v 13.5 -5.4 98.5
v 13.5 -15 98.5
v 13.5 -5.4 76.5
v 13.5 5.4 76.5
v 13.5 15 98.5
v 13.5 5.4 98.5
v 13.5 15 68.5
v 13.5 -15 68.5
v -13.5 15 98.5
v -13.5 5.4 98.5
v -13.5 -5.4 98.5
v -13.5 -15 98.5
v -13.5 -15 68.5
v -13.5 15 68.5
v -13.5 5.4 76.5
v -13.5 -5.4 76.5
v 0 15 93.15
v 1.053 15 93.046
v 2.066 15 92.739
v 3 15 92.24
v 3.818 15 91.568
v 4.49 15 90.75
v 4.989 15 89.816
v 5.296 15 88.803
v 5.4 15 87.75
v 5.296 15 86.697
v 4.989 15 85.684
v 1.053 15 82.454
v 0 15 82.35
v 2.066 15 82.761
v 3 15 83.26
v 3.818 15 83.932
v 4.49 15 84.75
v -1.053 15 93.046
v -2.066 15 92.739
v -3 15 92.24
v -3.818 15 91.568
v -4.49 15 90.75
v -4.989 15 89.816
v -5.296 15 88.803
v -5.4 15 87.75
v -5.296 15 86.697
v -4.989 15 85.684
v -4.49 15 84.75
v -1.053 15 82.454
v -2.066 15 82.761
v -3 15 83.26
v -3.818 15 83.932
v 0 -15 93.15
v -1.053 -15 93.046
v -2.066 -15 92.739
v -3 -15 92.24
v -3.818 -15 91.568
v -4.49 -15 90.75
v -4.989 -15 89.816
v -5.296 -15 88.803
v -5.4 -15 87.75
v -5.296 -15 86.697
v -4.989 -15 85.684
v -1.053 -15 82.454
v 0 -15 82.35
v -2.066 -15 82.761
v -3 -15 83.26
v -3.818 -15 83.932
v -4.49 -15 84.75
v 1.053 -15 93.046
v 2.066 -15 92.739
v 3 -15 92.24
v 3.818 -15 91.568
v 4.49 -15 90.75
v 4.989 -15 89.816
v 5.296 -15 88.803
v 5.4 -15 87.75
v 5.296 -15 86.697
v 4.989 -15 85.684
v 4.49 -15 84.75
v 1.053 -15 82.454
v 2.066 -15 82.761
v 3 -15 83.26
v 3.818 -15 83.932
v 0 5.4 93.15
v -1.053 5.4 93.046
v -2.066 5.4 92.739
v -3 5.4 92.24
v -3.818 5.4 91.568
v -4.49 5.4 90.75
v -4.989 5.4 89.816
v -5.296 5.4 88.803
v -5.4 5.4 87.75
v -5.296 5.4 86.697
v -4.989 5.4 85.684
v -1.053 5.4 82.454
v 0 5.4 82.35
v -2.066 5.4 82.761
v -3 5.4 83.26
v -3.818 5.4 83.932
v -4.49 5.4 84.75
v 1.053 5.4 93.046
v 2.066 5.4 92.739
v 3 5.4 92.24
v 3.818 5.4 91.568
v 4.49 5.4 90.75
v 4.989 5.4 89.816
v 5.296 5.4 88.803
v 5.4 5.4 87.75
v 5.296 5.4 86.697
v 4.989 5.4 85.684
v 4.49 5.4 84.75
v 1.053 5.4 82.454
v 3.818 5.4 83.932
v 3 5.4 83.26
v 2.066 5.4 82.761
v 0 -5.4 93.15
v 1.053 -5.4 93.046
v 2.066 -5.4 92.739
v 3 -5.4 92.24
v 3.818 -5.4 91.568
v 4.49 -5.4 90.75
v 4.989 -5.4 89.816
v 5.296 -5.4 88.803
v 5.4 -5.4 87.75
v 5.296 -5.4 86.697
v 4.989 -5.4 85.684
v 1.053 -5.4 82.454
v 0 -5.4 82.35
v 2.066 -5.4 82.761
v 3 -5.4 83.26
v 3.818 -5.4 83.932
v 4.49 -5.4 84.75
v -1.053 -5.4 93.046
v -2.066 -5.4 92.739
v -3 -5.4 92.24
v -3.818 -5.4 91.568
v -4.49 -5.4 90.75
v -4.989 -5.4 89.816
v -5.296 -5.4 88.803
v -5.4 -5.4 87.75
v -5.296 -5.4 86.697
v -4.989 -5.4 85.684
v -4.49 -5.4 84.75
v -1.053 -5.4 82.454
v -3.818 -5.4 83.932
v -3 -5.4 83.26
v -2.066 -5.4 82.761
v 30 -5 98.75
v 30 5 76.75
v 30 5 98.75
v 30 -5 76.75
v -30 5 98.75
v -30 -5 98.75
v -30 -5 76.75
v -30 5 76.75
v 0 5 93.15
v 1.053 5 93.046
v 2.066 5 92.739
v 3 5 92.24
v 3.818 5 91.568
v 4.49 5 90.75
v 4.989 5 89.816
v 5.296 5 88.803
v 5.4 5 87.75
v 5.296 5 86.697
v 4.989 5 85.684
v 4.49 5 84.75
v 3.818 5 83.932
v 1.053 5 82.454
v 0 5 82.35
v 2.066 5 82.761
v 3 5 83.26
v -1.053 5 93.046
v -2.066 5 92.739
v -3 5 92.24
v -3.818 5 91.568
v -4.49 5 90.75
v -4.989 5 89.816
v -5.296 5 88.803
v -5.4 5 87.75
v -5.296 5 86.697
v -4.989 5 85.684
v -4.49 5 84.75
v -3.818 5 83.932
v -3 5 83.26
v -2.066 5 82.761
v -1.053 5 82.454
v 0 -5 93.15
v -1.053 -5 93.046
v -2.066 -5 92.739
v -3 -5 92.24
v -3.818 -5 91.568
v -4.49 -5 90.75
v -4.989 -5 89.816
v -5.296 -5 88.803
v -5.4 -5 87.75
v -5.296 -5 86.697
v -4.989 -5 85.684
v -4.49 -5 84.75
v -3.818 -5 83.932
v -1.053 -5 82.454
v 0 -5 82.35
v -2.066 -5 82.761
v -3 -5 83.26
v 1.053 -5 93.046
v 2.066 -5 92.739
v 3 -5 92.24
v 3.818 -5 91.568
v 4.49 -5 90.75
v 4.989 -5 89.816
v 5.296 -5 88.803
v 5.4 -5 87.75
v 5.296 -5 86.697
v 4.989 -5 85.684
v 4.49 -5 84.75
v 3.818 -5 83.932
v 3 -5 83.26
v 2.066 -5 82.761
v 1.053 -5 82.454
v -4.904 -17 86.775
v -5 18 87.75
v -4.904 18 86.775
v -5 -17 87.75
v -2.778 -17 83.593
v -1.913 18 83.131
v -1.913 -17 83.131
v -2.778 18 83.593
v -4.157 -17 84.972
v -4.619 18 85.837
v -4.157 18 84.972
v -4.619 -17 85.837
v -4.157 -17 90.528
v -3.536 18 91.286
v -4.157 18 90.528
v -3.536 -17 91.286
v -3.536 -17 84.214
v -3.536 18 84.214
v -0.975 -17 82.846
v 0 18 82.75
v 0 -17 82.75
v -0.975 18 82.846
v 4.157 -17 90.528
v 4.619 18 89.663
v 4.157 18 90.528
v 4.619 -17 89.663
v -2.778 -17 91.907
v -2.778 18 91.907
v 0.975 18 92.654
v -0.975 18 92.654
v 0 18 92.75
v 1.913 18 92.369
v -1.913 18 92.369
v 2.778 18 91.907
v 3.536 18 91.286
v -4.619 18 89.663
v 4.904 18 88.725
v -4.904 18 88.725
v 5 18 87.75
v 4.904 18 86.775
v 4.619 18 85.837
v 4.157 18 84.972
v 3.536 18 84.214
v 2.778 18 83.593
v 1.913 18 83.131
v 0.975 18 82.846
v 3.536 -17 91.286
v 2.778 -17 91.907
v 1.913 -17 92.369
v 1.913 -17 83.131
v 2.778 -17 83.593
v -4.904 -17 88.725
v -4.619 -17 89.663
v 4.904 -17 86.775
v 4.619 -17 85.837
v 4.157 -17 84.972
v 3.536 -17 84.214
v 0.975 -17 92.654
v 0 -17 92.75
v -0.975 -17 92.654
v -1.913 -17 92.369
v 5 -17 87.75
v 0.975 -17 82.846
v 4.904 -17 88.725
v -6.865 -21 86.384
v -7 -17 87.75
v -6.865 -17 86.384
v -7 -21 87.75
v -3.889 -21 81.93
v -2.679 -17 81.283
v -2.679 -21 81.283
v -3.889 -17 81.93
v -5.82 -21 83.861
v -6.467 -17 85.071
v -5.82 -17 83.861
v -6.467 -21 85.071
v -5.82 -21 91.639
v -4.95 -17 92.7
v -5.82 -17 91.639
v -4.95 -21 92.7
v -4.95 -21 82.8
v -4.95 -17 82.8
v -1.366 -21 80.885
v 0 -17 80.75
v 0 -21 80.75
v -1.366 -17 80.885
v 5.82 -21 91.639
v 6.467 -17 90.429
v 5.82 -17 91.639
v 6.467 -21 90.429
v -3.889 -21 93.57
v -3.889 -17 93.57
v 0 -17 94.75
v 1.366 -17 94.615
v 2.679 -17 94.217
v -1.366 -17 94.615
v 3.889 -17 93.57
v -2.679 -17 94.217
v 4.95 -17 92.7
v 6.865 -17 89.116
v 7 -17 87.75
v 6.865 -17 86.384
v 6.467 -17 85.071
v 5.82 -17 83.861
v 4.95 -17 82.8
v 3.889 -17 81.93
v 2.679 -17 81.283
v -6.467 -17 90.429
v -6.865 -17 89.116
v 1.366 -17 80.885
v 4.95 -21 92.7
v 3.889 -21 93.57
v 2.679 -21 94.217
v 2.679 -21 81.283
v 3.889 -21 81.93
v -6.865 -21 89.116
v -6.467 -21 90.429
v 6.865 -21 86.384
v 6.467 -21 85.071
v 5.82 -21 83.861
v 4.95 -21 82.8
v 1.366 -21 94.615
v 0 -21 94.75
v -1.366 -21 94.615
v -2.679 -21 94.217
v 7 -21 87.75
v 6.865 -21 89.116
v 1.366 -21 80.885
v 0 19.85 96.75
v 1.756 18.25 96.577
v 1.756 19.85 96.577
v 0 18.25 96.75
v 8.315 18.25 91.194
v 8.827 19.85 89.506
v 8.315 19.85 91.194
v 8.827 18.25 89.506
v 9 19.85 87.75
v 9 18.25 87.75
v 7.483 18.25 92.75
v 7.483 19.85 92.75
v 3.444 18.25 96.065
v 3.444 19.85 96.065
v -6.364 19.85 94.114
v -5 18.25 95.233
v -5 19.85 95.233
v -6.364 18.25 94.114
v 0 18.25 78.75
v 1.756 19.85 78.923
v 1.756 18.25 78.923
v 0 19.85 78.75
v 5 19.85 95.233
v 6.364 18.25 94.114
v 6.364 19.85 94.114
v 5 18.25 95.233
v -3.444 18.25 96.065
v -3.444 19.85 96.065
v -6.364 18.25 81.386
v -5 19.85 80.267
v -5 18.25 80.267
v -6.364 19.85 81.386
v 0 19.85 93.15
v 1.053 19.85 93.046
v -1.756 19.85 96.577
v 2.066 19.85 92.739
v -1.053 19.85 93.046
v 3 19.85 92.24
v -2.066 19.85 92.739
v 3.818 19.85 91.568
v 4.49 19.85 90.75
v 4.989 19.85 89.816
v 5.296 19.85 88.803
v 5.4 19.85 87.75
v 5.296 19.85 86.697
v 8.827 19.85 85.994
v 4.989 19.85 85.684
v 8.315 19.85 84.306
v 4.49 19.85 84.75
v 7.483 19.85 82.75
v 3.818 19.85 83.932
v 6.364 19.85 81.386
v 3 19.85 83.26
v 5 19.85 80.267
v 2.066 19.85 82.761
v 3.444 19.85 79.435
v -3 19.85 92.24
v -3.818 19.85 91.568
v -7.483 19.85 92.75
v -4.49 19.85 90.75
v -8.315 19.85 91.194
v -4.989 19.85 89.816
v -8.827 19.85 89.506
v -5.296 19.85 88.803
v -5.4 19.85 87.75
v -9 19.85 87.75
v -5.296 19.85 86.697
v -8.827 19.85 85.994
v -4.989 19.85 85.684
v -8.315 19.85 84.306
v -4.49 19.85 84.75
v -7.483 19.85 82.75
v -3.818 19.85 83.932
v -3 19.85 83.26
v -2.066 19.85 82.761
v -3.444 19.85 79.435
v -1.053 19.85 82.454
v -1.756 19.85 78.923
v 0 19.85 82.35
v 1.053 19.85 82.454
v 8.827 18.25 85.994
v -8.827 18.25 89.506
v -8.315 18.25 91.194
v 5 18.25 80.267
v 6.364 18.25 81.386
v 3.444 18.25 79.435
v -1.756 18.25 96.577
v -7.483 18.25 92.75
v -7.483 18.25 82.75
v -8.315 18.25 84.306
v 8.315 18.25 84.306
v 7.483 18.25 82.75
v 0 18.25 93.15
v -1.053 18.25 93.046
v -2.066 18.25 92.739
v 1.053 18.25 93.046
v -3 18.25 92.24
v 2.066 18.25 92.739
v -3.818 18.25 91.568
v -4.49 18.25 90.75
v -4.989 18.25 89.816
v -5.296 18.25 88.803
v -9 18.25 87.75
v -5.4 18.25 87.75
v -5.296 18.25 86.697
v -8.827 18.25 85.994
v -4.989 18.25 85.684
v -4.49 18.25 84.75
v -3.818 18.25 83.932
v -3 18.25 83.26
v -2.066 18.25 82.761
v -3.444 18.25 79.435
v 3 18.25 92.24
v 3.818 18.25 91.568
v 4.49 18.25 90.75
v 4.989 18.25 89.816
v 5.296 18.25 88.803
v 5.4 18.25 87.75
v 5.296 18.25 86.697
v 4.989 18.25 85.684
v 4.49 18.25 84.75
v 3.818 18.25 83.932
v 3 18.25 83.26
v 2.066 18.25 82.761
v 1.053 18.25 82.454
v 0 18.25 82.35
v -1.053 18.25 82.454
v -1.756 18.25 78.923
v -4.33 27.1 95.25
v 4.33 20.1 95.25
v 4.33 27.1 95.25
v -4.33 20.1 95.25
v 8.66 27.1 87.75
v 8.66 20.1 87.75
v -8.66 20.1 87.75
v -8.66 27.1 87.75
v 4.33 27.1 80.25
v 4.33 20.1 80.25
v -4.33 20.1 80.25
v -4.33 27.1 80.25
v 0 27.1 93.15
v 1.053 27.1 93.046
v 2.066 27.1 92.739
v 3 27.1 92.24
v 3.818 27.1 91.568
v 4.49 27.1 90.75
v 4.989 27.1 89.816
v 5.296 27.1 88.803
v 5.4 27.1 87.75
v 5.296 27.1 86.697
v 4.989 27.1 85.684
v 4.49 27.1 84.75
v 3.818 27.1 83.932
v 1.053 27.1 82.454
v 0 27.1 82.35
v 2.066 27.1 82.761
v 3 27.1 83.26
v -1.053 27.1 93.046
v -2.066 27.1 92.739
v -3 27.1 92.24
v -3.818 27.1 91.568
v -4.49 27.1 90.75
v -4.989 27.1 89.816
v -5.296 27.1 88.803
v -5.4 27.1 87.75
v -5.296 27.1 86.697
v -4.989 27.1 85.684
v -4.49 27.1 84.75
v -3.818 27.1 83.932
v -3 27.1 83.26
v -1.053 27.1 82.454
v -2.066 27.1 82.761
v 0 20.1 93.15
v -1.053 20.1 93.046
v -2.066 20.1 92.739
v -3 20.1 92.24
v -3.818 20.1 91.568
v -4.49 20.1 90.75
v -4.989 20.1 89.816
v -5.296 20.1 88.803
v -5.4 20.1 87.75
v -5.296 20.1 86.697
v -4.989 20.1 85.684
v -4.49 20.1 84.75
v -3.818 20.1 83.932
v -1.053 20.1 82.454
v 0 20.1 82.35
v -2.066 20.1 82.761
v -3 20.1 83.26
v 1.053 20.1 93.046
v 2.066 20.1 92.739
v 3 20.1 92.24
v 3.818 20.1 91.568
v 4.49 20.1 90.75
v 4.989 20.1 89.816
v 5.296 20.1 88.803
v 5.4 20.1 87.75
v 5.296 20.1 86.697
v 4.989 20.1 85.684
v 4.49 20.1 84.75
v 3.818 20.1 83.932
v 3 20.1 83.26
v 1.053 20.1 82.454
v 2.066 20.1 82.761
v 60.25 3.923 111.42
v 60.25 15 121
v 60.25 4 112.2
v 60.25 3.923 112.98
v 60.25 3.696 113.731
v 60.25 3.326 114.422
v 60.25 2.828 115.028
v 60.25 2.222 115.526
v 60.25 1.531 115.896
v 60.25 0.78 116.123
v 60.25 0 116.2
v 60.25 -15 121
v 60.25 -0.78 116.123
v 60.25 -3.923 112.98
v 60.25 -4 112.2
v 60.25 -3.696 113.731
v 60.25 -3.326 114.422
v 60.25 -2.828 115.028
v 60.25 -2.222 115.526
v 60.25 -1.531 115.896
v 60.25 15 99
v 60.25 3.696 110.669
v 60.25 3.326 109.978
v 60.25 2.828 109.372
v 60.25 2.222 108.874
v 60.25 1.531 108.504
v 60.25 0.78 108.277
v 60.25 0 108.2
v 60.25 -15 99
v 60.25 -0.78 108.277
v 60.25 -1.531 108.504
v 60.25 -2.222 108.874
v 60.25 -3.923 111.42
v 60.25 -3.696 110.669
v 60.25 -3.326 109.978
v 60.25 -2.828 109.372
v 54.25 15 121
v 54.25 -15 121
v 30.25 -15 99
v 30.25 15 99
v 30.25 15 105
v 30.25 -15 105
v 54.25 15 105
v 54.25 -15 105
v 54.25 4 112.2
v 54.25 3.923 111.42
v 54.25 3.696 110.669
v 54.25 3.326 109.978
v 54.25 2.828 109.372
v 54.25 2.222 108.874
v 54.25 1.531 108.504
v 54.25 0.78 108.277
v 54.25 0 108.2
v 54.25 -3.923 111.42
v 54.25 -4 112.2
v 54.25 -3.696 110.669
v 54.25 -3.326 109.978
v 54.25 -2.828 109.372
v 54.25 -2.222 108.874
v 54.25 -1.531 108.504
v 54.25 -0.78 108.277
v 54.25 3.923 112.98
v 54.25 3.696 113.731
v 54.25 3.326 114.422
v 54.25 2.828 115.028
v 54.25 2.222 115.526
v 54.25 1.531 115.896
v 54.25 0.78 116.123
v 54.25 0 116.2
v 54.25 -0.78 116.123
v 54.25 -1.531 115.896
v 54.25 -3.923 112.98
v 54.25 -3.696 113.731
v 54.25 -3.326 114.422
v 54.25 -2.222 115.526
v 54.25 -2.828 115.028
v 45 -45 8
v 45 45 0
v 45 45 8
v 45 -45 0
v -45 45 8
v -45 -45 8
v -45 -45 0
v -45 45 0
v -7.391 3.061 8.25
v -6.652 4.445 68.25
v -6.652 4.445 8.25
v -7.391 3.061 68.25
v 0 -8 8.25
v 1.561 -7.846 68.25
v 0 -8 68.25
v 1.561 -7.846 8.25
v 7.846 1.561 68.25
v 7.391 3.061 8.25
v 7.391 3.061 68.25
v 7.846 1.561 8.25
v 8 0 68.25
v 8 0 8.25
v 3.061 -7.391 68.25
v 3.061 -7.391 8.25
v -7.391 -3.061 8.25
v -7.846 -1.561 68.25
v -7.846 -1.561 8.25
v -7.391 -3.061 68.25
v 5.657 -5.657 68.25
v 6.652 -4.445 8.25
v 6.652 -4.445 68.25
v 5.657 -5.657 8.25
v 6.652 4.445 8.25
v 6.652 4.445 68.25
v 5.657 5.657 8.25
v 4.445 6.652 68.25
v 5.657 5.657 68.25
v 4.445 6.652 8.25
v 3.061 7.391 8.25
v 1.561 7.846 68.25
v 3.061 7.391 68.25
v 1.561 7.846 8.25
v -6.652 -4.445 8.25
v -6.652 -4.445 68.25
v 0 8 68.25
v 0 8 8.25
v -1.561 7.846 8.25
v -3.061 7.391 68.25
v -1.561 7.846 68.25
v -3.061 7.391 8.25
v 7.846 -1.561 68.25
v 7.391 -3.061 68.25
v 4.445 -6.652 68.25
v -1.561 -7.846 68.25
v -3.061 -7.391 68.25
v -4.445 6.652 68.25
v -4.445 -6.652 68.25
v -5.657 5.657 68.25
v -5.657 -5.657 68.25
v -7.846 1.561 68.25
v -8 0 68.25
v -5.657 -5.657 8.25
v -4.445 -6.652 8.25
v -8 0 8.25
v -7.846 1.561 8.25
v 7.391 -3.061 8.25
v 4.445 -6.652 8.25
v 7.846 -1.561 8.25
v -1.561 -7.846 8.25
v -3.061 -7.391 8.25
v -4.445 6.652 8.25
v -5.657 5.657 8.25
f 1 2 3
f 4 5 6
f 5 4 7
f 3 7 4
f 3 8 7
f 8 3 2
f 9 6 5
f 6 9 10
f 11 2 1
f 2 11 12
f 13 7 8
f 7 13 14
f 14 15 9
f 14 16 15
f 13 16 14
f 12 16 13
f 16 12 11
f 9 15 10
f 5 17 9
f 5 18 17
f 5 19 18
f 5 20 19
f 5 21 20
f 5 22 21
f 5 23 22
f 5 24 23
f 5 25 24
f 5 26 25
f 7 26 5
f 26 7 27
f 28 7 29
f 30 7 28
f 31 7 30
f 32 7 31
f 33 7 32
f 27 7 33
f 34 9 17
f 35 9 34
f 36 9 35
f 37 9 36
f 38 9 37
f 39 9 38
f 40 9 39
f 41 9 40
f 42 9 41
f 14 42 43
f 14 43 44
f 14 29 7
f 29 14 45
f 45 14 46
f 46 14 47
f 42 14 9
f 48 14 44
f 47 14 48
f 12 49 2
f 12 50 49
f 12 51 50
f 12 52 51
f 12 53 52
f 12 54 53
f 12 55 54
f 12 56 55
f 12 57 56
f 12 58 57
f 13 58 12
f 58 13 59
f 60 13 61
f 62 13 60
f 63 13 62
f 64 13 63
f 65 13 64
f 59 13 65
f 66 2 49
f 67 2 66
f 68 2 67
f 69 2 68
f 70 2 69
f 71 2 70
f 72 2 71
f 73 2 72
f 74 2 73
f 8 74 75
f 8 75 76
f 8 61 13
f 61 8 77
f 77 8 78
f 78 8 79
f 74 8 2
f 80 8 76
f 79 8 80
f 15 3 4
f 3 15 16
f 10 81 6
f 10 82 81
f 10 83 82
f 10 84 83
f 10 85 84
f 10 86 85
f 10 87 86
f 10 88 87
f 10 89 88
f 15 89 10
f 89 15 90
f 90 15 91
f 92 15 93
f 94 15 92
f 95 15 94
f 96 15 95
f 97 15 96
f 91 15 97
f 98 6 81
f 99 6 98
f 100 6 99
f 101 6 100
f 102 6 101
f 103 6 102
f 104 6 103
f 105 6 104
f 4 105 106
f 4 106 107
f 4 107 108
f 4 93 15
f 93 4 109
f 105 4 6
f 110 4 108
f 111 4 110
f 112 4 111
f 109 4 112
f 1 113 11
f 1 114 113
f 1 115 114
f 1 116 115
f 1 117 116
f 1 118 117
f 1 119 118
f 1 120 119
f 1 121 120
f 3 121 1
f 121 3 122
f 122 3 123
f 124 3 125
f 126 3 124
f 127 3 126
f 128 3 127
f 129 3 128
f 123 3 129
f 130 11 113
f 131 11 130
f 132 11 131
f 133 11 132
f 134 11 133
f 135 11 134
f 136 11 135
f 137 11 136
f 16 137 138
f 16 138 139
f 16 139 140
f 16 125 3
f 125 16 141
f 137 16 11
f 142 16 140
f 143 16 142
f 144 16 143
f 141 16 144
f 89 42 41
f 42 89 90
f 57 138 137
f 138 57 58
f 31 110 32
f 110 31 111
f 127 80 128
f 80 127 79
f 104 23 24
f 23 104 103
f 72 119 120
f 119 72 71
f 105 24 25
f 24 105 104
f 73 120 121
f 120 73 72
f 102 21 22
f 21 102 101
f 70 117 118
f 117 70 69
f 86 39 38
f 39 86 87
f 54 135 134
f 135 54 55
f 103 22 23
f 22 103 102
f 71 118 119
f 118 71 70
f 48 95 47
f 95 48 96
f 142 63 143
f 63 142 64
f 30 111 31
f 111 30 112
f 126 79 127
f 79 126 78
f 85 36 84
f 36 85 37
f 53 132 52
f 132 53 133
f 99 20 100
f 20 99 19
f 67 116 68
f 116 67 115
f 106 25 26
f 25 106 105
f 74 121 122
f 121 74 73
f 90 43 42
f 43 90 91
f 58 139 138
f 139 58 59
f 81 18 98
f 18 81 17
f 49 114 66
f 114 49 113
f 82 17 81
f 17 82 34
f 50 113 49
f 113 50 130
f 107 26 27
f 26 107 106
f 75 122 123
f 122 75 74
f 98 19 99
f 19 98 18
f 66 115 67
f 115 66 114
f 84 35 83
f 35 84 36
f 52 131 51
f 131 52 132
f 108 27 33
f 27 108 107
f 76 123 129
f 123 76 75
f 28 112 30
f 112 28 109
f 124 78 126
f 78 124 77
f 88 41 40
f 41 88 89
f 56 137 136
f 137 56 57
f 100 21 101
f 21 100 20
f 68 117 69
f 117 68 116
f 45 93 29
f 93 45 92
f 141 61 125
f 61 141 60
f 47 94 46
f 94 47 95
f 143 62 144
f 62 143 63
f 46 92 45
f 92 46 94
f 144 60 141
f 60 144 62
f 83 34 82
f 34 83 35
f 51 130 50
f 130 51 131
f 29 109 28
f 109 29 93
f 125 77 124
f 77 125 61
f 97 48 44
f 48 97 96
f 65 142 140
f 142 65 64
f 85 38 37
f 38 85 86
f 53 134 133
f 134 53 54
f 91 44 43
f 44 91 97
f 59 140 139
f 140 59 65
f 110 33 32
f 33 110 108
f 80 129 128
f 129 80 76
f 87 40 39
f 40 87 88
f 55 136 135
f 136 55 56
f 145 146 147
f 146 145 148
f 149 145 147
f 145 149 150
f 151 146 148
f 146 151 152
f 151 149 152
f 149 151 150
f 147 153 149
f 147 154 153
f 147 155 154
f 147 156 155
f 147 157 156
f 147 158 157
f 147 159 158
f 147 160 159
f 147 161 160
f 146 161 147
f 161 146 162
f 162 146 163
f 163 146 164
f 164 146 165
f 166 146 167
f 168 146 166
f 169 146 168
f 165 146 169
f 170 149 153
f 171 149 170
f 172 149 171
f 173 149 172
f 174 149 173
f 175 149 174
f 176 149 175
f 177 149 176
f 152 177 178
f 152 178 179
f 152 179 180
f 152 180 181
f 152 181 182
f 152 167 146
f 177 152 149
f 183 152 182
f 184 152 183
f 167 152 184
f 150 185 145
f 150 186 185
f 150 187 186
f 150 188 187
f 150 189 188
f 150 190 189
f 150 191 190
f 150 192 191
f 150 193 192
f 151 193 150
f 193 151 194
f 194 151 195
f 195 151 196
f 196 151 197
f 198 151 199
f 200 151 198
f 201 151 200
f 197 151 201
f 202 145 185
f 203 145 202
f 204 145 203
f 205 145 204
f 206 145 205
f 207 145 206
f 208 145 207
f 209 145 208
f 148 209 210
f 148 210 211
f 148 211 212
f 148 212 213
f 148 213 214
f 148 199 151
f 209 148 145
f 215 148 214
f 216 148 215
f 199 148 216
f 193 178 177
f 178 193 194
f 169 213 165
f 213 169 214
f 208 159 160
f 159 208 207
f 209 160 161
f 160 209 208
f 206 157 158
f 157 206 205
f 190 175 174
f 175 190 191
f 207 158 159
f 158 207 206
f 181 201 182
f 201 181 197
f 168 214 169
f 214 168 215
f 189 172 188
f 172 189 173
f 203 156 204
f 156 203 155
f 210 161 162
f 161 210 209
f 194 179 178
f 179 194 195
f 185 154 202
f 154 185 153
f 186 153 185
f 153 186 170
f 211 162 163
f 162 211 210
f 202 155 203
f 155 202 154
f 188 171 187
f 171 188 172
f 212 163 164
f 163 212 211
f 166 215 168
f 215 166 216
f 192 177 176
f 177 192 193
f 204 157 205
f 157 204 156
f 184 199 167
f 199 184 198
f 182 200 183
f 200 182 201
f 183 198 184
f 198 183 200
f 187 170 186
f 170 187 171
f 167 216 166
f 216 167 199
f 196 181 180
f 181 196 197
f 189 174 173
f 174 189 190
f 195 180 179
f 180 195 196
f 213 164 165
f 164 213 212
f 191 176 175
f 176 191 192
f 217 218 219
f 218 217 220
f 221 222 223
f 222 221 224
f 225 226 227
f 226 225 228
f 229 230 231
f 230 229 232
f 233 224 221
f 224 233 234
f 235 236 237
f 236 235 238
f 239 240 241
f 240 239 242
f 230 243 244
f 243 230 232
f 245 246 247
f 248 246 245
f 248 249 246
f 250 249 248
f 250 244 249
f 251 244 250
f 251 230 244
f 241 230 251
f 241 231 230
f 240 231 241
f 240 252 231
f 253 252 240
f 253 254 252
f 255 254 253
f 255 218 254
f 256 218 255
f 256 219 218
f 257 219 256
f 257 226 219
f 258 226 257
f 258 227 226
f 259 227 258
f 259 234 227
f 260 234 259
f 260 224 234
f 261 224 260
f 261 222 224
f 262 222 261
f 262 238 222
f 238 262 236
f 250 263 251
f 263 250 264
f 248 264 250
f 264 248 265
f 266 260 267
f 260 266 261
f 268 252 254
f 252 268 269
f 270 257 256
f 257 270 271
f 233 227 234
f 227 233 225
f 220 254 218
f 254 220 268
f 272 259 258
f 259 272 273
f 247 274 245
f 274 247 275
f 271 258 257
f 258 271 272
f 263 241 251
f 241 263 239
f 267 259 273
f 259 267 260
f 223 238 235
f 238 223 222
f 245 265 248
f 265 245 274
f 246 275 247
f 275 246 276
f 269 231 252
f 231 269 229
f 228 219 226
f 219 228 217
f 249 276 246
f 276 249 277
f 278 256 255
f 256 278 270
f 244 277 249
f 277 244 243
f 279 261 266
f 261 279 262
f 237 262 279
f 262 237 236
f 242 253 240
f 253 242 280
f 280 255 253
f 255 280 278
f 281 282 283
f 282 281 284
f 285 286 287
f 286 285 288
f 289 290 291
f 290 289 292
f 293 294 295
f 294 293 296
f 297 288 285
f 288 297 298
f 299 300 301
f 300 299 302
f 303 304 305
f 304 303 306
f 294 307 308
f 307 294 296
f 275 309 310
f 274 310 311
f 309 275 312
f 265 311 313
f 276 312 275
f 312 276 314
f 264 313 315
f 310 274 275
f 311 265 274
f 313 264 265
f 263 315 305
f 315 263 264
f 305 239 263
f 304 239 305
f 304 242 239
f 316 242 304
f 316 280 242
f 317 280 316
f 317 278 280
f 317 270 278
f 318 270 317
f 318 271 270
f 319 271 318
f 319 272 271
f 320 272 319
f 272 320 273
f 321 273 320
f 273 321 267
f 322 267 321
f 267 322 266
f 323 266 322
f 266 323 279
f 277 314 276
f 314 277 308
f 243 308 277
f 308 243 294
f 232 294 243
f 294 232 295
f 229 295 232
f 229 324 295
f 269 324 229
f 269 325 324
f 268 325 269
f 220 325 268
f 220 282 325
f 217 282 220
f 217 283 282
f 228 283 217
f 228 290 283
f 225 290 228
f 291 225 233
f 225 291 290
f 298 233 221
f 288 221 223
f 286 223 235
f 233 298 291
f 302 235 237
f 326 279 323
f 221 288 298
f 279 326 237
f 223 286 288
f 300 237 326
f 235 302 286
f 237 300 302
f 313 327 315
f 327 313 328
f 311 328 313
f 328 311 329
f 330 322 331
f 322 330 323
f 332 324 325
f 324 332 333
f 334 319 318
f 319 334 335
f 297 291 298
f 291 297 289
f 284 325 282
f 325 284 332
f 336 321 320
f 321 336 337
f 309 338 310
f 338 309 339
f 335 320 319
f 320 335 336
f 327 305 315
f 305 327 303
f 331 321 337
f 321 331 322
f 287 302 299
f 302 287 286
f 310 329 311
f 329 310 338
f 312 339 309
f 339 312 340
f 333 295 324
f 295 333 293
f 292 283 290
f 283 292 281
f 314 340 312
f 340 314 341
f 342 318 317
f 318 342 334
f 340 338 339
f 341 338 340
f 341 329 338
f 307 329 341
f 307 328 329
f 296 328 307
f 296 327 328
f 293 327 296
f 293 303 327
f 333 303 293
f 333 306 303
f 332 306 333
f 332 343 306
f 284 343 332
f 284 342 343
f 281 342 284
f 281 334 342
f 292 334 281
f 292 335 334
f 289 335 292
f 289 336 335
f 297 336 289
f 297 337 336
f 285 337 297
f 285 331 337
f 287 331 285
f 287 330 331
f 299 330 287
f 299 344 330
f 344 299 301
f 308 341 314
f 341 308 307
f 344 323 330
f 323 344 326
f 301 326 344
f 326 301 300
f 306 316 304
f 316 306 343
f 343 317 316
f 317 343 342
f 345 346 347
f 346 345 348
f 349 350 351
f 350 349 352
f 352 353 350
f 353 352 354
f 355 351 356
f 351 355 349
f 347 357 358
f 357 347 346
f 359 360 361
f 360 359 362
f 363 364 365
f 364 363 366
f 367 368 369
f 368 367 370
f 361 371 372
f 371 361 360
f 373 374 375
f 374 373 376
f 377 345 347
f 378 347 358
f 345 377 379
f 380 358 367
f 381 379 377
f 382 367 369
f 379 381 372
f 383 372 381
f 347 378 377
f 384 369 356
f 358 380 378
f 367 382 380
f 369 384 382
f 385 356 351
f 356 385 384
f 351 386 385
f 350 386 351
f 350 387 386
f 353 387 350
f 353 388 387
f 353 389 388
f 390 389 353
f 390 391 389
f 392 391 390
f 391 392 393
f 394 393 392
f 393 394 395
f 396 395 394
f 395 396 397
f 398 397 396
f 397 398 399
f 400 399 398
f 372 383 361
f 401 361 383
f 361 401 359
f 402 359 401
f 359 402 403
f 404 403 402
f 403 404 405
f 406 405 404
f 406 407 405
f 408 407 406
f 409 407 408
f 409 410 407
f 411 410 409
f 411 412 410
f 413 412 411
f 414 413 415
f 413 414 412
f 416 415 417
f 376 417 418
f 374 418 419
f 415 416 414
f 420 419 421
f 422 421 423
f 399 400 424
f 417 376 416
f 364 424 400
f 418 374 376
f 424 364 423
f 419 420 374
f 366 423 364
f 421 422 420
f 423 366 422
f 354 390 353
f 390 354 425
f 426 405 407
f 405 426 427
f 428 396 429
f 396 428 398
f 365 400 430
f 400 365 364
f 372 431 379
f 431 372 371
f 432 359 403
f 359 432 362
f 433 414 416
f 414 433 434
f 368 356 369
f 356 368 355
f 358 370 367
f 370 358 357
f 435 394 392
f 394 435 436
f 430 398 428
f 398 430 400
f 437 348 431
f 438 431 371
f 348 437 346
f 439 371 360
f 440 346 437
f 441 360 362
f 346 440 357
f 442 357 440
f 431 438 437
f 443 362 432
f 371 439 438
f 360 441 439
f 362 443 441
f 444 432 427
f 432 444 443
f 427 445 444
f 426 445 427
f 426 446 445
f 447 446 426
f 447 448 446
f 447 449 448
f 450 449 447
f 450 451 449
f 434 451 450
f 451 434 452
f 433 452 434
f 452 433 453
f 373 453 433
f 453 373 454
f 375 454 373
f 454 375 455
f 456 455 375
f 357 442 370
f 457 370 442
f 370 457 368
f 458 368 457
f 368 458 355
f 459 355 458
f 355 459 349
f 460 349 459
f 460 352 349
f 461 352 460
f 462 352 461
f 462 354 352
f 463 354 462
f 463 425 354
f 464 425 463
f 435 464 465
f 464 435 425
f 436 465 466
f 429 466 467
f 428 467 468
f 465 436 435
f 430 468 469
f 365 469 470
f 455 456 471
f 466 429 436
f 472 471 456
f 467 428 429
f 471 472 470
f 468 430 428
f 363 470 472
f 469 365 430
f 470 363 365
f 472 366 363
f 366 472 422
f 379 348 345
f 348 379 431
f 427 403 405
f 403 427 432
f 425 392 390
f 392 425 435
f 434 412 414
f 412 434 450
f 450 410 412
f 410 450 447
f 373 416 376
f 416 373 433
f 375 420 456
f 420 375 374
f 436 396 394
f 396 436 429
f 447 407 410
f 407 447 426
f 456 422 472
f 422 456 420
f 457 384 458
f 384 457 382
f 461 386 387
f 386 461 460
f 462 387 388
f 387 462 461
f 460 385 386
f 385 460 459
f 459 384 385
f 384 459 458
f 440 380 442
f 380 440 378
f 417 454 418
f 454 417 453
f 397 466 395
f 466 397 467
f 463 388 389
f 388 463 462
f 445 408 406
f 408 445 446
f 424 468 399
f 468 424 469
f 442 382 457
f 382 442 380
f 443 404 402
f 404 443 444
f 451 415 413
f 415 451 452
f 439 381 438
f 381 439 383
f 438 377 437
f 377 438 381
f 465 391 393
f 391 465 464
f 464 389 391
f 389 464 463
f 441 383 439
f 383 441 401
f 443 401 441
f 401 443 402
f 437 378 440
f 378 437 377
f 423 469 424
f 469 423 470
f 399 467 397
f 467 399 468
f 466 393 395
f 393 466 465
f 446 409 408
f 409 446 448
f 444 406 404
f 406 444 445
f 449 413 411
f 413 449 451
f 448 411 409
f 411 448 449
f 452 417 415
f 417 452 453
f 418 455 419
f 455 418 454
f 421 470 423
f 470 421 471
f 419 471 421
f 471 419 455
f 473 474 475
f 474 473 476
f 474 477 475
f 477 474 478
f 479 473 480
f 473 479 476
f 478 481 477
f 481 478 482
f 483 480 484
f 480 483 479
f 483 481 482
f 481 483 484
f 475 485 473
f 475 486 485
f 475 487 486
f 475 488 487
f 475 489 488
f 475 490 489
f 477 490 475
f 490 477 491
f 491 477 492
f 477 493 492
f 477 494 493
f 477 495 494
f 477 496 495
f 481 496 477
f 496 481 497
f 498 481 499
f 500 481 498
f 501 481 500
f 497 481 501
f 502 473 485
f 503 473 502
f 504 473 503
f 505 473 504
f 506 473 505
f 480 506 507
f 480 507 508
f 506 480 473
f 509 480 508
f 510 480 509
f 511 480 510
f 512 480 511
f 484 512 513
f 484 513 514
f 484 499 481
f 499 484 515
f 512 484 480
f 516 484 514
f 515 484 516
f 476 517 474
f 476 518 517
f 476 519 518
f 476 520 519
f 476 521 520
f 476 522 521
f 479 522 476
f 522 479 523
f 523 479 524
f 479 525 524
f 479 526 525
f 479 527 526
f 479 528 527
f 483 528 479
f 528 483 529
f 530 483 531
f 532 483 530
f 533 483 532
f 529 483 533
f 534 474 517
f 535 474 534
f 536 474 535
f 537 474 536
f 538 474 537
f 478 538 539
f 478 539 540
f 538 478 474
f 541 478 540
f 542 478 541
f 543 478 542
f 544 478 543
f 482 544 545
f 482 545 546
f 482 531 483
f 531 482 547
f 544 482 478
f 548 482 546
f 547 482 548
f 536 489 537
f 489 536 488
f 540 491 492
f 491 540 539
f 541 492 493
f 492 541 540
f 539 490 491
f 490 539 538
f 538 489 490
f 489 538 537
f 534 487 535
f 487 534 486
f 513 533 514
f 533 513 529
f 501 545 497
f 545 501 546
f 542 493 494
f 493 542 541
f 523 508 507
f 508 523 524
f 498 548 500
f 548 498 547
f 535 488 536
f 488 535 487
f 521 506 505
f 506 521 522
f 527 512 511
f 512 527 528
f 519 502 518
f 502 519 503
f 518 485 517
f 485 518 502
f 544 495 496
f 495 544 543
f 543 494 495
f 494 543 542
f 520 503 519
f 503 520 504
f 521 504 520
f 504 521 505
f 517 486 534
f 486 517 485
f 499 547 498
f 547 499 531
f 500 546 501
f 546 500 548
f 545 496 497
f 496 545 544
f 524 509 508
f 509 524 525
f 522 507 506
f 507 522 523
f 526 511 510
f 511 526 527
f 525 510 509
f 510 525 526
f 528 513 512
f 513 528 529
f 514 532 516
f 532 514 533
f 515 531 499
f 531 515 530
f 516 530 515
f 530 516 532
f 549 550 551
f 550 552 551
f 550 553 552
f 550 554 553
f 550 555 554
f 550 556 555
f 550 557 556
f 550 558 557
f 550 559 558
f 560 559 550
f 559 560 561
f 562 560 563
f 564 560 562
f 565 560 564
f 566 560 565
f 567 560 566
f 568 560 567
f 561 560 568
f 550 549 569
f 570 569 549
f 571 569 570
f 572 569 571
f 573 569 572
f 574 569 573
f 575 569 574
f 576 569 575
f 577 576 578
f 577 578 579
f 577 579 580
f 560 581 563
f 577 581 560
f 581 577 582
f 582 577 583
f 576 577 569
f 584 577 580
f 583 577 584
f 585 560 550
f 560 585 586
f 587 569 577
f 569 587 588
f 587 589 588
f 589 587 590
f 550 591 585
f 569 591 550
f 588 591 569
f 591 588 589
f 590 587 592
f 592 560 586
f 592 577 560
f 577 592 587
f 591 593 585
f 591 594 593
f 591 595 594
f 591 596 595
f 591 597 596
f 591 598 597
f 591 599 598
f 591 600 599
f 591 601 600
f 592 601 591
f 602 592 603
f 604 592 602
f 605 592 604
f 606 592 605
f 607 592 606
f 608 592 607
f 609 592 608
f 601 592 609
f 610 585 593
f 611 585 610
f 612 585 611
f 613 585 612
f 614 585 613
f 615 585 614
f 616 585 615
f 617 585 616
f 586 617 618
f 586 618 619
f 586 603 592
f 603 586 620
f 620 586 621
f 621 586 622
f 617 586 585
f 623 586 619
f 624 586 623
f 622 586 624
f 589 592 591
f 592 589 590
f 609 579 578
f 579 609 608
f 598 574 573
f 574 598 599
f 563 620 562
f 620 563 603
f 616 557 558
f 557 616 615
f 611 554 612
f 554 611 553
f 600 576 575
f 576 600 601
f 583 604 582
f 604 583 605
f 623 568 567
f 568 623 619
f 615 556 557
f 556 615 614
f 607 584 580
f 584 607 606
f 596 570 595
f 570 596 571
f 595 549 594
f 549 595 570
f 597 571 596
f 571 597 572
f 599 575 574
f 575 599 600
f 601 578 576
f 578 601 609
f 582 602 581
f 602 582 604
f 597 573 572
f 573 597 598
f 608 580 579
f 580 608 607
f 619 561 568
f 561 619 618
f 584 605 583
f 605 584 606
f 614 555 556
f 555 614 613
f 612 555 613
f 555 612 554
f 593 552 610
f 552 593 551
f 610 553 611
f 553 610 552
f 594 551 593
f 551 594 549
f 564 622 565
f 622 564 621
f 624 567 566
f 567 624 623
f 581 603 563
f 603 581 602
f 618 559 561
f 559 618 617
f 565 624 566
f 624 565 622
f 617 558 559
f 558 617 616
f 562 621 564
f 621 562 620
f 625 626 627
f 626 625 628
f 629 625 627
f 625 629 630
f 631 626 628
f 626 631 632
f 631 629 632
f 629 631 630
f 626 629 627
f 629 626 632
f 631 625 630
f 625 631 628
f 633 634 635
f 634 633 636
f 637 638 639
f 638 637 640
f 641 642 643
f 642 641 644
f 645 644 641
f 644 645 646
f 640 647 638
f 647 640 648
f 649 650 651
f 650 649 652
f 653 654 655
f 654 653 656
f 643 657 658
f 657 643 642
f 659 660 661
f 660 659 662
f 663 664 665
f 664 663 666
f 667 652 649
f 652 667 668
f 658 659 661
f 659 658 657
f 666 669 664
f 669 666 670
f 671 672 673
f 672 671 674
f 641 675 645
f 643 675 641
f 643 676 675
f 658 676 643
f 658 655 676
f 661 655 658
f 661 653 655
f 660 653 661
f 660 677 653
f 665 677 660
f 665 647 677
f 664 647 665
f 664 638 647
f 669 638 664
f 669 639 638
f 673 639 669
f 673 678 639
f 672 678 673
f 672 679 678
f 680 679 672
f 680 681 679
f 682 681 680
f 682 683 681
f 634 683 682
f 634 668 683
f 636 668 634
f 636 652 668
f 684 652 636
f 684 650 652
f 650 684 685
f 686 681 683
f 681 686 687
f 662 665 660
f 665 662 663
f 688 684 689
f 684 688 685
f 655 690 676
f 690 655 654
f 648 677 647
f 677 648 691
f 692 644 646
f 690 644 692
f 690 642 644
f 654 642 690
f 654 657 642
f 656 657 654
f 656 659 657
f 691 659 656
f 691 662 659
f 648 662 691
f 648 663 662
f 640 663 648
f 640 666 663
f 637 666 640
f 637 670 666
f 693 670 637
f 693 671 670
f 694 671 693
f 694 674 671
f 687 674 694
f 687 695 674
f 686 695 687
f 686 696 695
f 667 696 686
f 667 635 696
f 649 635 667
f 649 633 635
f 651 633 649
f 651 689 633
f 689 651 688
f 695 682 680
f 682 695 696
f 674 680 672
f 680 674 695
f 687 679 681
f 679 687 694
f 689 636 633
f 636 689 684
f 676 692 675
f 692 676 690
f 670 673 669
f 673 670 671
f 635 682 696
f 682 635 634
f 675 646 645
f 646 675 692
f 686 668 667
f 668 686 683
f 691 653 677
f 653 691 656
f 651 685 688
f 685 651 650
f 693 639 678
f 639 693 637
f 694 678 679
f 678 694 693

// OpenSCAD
$fn = 32;

// ------------------------------------------------------------------------
// Lamp arm: column d16 x 60 mm, arm 60 mm
// Every part is its own module, assembly() places every instance.
// ------------------------------------------------------------------------

// --- part 1 ---
module lamp_base() {
  difference() {
    translate([-45, -45, 0]) cube([90, 90, 8]);
  }
}

// --- part 2 ---
module lamp_column() {
  cylinder(h = 60, d = 16);
}

// --- part 3 ---
module head_fork() {
  difference() {
    translate([-13.5, -15, 0]) cube([27, 30, 30]);
    translate([-14.5, -5.4, 8]) cube([29, 10.8, 23]);
    translate([0, 0, 19.25]) rotate([90, 0, 0]) cylinder(h = 32, d = 10.8, center = true);
  }
}

// --- part 4 ---
module lamp_arm() {
  difference() {
    translate([-30, -5, 0]) cube([60, 10, 22]);
    translate([0, 0, 11]) rotate([90, 0, 0]) cylinder(h = 12, d = 10.8, center = true);
  }
}

// --- part 5 ---
module arm_pin() {
  rotate([0, 90, 0]) cylinder(h = 36, d = 10, center = true);
  translate([-21, 0, 0]) rotate([0, 90, 0]) cylinder(h = 4, d = 14);
}

// --- part 6 ---
module arm_washer() {
  difference() {
      translate([0, 0, 0]) cylinder(h = 1.6, d = 18);
      translate([0, 0, -1]) cylinder(h = 3.6, d = 10.8);
    }
}

// --- part 7 ---
module arm_nut() {
  difference() {
    linear_extrude(height = 7) polygon(points = [[8.66, 0], [4.33, 7.5], [-4.33, 7.5], [-8.66, 0], [-4.33, -7.5], [4.33, -7.5]]);
    translate([0, 0, -1]) cylinder(h = 9, d = 10.8);
  }
}

// --- part 8 ---
module shade_bracket() {
  difference() {
    translate([-15, -15, 0]) cube([30, 30, 22]);
    translate([-16, -16, 6]) cube([25, 32, 17]);
    translate([12, 0, 13.2]) rotate([0, 90, 0]) cylinder(h = 8, d = 8, center = true);
  }
}

// --- assembly ---
module assembly() {
  color([0.80, 0.24, 0.20]) translate([0, 0, 0]) rotate([0, 0, 0]) lamp_base();
  color([0.20, 0.45, 0.75]) translate([0, 0, 8.25]) rotate([0, 0, 0]) lamp_column();
  color([0.25, 0.62, 0.32]) translate([0, 0, 68.5]) rotate([0, 0, 0]) head_fork();
  color([0.92, 0.70, 0.18]) translate([0, 0, 76.75]) rotate([0, 0, 0]) lamp_arm();
  color([0.58, 0.35, 0.70]) translate([0, 0, 87.75]) rotate([0, 0, 90]) arm_pin();
  color([0.16, 0.66, 0.66]) translate([0, 19.85, 87.75]) rotate([90, 0, 0]) arm_washer();
  color([0.85, 0.48, 0.18]) translate([0, 27.1, 87.75]) rotate([90, 0, 0]) arm_nut();
  color([0.55, 0.60, 0.65]) translate([45.25, 0, 99]) rotate([0, 0, 0]) shade_bracket();
}

assembly();
